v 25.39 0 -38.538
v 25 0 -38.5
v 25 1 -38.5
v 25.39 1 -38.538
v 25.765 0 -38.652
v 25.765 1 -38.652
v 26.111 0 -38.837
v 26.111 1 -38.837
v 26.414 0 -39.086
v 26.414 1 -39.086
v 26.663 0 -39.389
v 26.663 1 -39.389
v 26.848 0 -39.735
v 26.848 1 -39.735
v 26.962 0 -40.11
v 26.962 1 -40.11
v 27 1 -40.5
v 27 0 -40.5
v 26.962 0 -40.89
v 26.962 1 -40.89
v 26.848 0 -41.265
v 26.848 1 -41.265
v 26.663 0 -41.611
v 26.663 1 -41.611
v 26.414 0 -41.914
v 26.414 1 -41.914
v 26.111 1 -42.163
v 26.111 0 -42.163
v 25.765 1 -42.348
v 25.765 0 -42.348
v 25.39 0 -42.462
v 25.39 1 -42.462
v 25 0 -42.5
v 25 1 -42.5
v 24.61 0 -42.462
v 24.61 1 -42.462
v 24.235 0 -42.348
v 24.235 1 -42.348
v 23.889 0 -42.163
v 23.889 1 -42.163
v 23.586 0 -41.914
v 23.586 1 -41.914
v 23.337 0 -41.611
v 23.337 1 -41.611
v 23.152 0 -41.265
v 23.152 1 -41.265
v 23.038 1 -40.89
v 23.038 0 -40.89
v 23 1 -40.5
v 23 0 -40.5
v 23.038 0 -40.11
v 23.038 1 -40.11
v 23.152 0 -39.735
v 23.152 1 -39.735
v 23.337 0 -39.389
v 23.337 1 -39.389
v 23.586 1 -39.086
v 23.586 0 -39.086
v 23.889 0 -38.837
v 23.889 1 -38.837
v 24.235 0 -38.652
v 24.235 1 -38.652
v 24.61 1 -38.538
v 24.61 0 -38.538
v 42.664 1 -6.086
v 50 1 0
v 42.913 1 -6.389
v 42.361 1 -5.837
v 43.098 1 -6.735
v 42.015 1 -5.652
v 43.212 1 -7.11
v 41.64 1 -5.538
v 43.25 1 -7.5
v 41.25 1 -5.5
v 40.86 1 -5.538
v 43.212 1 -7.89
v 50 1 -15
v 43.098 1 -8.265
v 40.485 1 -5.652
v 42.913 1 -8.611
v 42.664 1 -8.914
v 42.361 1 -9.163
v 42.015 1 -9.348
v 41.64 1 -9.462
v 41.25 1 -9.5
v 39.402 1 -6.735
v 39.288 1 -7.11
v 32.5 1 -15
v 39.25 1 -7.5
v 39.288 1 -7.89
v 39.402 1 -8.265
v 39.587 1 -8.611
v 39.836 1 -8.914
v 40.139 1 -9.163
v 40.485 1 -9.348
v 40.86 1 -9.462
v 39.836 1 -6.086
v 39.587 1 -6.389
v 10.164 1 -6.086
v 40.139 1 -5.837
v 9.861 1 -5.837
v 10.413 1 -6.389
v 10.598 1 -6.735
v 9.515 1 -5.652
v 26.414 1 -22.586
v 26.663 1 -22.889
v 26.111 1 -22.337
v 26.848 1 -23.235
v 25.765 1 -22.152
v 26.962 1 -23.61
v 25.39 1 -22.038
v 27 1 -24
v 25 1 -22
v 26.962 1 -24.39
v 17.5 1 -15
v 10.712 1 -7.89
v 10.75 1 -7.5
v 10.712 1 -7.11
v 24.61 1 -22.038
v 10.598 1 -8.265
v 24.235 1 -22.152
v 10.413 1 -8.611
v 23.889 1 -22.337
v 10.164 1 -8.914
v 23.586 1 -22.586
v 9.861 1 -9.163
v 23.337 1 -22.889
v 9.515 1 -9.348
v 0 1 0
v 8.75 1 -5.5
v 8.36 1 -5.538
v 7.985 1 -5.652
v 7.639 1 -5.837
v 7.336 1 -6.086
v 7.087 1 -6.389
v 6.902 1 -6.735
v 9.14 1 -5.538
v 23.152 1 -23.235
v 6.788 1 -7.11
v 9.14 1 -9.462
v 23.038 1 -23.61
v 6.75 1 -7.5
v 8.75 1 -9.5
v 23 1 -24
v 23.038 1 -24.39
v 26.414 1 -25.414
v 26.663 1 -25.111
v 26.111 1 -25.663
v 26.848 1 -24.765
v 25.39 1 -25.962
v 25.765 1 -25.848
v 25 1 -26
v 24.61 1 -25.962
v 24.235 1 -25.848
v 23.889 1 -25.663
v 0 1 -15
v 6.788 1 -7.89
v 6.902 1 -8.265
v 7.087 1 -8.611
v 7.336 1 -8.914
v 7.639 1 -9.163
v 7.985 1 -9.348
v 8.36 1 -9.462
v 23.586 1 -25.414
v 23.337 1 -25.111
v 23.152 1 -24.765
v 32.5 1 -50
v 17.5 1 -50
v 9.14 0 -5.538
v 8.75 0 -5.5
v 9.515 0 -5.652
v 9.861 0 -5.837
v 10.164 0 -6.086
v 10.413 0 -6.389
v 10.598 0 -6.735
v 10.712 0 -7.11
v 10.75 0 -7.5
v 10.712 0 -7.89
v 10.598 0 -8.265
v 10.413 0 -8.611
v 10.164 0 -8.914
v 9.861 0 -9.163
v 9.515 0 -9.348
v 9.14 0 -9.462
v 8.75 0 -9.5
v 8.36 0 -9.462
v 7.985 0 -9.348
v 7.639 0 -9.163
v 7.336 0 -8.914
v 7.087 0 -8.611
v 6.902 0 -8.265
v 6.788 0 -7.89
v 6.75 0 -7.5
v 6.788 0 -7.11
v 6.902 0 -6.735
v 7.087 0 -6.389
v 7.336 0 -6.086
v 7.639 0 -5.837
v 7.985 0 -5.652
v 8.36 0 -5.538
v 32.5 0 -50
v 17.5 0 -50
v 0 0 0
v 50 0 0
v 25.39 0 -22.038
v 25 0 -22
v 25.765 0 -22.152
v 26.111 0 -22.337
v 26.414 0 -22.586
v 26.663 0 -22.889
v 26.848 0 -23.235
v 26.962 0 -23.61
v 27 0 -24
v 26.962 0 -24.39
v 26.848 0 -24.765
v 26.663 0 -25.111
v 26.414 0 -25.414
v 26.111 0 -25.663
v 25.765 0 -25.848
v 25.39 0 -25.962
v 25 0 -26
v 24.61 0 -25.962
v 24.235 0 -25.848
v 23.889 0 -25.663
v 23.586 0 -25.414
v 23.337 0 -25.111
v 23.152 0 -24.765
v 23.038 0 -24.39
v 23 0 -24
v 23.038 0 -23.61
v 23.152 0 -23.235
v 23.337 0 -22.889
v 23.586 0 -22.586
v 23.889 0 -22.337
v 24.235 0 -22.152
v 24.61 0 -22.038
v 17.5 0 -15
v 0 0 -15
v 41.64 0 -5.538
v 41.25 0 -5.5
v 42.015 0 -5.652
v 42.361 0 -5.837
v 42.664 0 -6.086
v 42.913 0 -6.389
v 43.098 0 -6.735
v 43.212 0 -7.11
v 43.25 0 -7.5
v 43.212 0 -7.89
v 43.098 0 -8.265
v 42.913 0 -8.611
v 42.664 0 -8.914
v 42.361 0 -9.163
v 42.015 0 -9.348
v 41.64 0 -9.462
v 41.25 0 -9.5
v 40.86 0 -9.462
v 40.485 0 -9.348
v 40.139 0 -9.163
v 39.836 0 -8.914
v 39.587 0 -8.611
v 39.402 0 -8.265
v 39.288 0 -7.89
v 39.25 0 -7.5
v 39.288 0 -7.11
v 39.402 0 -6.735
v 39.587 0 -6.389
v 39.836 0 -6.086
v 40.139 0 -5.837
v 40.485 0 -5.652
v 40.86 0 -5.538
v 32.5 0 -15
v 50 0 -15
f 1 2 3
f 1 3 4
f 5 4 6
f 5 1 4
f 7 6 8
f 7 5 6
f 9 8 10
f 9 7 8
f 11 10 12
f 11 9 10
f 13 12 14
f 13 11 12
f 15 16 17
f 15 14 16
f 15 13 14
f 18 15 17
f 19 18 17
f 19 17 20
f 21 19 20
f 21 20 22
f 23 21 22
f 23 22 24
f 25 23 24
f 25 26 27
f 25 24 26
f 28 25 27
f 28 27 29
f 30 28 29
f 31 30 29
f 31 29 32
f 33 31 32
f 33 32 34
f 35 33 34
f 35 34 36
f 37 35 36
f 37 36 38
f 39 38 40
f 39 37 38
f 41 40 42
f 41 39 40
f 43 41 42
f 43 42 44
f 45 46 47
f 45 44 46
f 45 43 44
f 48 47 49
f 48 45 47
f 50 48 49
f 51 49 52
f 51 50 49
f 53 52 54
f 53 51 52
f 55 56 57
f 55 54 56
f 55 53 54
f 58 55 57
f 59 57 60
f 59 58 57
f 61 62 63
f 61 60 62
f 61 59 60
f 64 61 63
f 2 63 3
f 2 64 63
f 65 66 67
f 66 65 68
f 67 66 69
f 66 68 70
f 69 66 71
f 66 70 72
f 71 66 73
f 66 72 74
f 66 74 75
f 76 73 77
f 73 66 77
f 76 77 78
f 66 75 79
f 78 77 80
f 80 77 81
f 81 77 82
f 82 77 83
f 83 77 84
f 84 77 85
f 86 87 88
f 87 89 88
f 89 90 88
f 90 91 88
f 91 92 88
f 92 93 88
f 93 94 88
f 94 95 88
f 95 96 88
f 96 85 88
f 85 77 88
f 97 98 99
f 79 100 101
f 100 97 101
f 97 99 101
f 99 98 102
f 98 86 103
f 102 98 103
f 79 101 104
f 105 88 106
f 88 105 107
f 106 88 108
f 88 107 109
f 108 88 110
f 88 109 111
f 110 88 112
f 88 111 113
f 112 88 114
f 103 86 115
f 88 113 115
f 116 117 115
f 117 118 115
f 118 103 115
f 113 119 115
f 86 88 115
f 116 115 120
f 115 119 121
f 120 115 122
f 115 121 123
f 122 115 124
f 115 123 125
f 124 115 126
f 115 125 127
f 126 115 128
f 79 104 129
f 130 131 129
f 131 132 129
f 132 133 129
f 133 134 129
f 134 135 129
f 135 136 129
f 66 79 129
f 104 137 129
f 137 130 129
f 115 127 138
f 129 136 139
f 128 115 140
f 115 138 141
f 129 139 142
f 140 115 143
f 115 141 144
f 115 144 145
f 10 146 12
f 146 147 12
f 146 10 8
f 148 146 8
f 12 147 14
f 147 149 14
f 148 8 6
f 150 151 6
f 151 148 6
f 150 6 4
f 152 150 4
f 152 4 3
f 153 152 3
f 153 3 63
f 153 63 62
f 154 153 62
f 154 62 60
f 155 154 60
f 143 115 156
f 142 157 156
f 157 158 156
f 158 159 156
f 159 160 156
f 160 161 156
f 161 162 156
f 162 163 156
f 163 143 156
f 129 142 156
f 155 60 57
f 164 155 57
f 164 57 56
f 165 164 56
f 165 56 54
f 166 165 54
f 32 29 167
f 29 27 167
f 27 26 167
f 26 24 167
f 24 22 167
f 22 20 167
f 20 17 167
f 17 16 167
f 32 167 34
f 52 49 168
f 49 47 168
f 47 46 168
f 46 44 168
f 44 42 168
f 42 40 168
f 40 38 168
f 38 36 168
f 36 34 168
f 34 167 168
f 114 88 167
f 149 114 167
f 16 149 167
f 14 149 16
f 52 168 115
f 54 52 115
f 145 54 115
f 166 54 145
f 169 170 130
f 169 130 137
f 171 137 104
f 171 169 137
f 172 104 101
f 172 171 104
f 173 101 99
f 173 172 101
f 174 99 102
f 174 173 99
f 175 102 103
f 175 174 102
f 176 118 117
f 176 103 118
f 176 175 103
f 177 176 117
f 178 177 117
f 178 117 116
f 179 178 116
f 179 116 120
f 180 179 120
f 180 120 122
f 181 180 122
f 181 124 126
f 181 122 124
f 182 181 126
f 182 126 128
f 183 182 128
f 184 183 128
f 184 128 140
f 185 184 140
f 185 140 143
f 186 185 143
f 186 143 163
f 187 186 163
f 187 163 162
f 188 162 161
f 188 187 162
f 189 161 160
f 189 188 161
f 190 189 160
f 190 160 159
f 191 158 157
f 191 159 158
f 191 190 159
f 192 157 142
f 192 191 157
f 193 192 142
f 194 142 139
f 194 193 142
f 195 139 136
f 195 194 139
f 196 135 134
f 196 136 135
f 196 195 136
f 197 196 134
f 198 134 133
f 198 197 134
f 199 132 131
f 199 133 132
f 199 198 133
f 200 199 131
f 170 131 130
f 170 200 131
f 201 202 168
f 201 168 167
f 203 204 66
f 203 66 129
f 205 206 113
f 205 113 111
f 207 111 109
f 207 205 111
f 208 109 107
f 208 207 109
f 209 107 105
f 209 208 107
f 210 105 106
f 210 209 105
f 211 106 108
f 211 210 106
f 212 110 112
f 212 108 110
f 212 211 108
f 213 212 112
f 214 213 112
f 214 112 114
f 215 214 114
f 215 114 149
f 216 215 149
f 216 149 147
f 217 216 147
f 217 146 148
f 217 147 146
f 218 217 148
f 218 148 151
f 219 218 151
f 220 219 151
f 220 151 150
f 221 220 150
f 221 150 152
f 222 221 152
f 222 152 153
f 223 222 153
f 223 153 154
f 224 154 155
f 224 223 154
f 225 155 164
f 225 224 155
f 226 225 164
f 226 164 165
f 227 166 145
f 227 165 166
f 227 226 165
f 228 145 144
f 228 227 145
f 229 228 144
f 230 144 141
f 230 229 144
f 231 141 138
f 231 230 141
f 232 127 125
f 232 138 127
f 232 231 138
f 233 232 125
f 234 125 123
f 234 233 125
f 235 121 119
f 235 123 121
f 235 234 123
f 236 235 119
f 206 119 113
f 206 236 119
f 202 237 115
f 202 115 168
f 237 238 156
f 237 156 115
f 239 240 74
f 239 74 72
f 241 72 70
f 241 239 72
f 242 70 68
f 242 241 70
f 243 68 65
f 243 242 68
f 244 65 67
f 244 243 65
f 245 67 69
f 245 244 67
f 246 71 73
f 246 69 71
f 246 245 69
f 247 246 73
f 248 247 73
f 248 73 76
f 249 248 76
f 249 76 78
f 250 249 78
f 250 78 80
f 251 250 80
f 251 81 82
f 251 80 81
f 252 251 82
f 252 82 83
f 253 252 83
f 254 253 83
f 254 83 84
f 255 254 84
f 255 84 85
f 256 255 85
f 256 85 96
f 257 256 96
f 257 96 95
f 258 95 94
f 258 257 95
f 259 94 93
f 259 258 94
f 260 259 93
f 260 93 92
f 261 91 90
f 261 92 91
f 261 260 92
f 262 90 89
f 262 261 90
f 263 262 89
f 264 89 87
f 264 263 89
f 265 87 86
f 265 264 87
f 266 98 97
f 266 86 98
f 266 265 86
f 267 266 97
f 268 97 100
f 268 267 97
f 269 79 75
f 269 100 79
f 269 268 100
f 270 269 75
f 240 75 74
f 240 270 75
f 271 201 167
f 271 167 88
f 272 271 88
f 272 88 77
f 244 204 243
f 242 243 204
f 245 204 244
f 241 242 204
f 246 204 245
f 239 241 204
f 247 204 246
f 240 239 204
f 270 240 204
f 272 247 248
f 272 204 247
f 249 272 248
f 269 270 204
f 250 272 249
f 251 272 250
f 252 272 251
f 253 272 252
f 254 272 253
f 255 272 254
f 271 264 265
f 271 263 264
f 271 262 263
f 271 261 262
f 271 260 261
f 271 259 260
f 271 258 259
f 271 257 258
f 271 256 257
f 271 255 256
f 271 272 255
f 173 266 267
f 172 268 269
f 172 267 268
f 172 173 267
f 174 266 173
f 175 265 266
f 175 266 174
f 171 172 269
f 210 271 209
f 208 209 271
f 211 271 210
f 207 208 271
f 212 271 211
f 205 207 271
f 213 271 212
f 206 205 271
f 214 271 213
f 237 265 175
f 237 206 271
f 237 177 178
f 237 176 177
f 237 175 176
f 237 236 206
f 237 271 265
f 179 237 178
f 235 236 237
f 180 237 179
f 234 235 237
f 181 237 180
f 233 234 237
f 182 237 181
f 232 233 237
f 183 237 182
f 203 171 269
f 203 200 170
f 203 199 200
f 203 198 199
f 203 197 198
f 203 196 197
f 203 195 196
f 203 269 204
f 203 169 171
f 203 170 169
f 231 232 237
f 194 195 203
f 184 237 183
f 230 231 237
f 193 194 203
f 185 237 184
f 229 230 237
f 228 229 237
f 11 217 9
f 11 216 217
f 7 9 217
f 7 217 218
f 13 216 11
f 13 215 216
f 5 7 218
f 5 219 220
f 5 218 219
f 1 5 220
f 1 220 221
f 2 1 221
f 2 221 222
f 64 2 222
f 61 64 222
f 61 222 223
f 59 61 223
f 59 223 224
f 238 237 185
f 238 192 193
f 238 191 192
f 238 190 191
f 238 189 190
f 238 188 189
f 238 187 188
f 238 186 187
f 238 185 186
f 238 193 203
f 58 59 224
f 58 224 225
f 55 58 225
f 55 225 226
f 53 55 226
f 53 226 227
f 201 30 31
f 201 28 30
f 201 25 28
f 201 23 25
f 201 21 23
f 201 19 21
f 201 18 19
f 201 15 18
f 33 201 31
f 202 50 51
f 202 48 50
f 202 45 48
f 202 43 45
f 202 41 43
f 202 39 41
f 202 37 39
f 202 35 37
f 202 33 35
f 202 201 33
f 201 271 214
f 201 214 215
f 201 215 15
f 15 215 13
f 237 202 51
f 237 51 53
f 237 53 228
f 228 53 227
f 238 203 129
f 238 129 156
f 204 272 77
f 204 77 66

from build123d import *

# Parameters (mm, degrees)
BOSS_EXTRUDE1_DEPTH     = 1
CUT_EXTRUDE1_DEPTH      = 71.717748833
CUT_EXTRUDE1_DEPTH_BACK = 71.717748833
SKETCH2_R               = 2


with BuildPart() as part:
    # Sketch1 → Boss-Extrude1 (new body)
    with BuildSketch(Plane(origin=(0, 0, 0), x_dir=(1, 0, 0), z_dir=(0, 1, 0))):
        Polygon((17.5, 50), (32.5, 50), (32.5, 15), (50, 15), (50, 0), (0, 0), (0, 15), (17.5, 15), align=None)
    extrude(amount=BOSS_EXTRUDE1_DEPTH)

    # Sketch2 → Cut-Extrude1 (cut, two sides: drawn at the far end of the back side and taken through both)
    with BuildSketch(Plane(origin=(0, 1, 0), x_dir=(1, 0, 0), z_dir=(0, 1, 0)).offset(-CUT_EXTRUDE1_DEPTH_BACK)):
        with Locations(Location((41.25, 7.5, 0), (0, 0, 270))):
            Circle(SKETCH2_R)
        with Locations(Location((25, 40.5, 0), (0, 0, 270))):
            Circle(SKETCH2_R)
        with Locations(Location((25, 24, 0), (0, 0, 270))):
            Circle(SKETCH2_R)
        with Locations(Location((8.75, 7.5, 0), (0, 0, 270))):
            Circle(SKETCH2_R)
    extrude(amount=CUT_EXTRUDE1_DEPTH + CUT_EXTRUDE1_DEPTH_BACK, mode=Mode.SUBTRACT)


solid = part.part
